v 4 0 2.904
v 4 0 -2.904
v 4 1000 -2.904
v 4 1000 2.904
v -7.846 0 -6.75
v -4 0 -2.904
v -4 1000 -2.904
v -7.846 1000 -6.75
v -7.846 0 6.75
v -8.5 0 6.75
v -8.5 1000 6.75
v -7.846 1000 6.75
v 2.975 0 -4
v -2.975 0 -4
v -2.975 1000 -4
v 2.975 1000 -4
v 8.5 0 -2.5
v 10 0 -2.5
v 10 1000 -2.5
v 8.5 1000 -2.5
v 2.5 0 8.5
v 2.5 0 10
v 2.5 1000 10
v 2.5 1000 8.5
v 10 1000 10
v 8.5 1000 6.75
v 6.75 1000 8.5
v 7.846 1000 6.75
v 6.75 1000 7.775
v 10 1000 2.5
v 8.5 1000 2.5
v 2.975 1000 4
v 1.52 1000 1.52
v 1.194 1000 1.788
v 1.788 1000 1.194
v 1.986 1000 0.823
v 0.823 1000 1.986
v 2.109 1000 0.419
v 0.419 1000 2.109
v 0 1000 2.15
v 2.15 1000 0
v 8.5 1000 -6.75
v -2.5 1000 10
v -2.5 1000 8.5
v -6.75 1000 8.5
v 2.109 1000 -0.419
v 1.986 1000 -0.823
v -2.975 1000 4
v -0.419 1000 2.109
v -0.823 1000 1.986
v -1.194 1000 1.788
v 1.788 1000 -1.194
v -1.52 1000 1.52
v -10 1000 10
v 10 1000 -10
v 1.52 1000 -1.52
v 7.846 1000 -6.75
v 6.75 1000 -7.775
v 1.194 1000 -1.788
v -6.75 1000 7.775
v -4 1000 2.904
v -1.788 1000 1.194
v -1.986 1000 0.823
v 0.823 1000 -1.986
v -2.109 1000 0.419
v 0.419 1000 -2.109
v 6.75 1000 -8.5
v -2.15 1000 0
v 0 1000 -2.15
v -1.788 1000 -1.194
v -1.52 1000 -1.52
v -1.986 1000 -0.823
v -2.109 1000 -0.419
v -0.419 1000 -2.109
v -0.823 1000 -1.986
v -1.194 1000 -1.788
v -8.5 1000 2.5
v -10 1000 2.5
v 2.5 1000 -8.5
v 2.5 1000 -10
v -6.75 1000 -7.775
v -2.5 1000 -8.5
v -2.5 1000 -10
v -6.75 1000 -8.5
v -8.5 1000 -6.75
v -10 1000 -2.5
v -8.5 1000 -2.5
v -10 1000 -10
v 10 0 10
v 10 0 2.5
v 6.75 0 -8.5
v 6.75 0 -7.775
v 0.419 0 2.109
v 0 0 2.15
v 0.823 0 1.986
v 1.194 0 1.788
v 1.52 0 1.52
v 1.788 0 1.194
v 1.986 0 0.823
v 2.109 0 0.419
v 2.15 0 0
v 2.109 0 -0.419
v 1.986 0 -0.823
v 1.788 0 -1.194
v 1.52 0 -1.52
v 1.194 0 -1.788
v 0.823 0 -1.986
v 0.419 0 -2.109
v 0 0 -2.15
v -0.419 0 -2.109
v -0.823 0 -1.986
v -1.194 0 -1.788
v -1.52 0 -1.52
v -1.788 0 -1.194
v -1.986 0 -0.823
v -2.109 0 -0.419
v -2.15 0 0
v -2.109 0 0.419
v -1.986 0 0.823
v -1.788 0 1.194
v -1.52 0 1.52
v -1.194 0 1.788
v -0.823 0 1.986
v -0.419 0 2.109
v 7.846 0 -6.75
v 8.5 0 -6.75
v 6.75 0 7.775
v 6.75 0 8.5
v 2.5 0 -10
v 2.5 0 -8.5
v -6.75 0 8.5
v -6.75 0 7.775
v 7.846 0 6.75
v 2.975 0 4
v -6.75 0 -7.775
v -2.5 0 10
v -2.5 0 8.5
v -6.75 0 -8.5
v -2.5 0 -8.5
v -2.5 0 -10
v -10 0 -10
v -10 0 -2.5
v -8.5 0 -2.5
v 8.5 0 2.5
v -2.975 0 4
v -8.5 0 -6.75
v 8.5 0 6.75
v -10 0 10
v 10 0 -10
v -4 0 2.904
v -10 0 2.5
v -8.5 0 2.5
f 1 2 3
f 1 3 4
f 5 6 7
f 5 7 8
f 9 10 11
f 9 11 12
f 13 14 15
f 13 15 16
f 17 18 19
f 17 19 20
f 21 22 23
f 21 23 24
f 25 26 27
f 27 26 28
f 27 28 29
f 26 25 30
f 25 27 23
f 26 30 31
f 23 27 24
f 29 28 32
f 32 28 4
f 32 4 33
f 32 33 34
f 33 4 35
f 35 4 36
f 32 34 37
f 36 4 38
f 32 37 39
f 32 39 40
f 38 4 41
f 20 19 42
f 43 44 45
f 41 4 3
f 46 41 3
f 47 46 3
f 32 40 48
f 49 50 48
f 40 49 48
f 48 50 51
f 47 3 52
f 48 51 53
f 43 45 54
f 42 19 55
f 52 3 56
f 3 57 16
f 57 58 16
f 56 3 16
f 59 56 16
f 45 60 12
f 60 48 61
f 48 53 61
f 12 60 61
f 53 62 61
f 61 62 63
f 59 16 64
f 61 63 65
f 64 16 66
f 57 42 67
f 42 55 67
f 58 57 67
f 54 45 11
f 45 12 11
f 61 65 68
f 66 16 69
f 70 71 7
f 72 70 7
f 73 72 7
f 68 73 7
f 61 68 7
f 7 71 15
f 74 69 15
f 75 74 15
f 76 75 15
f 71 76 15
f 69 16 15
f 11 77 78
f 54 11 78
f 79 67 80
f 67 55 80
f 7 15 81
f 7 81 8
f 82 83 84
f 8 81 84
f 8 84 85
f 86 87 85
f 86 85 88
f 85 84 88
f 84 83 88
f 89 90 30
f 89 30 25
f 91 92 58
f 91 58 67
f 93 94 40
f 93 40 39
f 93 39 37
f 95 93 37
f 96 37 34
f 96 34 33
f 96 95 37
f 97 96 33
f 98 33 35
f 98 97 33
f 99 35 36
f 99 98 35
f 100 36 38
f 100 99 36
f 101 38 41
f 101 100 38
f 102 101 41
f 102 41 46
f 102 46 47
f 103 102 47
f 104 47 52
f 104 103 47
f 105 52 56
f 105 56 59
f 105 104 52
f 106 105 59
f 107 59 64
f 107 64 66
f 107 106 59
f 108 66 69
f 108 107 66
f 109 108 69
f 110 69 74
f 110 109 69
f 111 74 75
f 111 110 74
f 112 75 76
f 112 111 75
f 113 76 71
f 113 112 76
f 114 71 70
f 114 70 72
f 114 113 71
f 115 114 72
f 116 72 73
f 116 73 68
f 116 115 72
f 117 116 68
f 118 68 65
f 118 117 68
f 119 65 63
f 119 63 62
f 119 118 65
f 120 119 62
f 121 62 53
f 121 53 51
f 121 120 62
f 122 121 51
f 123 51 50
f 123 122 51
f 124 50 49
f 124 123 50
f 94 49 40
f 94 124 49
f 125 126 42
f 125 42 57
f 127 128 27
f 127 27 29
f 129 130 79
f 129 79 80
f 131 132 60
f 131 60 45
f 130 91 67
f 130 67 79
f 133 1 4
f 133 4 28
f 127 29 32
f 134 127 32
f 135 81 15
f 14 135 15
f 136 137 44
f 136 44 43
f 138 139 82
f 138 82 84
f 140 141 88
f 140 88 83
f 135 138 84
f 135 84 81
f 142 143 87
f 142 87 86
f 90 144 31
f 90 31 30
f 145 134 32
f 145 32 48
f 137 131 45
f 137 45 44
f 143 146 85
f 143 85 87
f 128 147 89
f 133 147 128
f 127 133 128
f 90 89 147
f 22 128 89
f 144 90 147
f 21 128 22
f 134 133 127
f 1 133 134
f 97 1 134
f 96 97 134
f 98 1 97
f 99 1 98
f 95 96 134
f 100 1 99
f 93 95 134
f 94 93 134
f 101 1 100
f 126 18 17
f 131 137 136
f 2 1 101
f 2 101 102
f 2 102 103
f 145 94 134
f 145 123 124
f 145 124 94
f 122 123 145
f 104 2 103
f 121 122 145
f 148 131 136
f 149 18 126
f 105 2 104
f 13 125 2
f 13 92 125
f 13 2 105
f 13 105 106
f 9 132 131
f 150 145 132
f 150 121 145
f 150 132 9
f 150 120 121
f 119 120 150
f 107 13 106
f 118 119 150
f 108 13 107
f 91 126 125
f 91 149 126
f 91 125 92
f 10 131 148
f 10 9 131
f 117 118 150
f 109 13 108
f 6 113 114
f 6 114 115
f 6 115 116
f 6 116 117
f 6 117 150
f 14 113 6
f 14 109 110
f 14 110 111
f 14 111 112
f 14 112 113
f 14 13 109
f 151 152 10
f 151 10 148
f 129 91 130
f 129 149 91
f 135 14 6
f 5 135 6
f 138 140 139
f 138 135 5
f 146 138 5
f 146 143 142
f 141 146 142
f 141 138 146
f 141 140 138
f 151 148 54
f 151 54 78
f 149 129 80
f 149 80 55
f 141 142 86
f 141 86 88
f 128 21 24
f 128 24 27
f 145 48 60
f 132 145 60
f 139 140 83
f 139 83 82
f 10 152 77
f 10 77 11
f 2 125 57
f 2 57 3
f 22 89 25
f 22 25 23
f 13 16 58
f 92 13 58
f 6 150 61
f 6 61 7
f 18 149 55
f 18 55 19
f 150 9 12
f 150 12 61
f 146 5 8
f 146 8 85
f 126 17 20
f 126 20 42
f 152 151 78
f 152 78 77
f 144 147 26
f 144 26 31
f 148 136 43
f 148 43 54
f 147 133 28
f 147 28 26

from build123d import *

# Parameters (mm, degrees)
SKETCH1_R           = 2.15
BOSS_EXTRUDE1_DEPTH = 1000


with BuildPart() as part:
    # Sketch1 → Boss-Extrude1 (new body)
    with BuildSketch(Plane(origin=(0, 0, 0), x_dir=(1, 0, 0), z_dir=(0, 1, 0))):
        Polygon((-10, 10), (-2.5, 10), (-2.5, 8.499999999), (-6.75, 8.499999999), (-6.75, 7.77515127), (-2.97484873, 4), (2.97484873, 4), (6.75, 7.77515127), (6.75, 8.499999999), (2.5, 8.499999999), (2.5, 10), (10, 10), (10, 2.5), (8.5, 2.5), (8.5, 6.75), (7.846169074, 6.75), (4, 2.903830926), (4, -2.903830926), (7.846169074, -6.75), (8.5, -6.75), (8.5, -2.5), (10, -2.5), (10, -10), (2.5, -10), (2.5, -8.499999999), (6.75, -8.499999999), (6.75, -7.77515127), (2.97484873, -4), (-2.97484873, -4), (-6.75, -7.77515127), (-6.75, -8.499999999), (-2.5, -8.499999999), (-2.5, -10), (-10, -10), (-10, -2.5), (-8.5, -2.5), (-8.5, -6.75), (-7.846169074, -6.75), (-4, -2.903830926), (-4, 2.903830926), (-7.846169074, 6.75), (-8.5, 6.75), (-8.5, 2.5), (-10, 2.5), align=None)
        with Locations(Location((0, 0, 0), (0, 0, 270))):
            Circle(SKETCH1_R, mode=Mode.SUBTRACT)
    extrude(amount=BOSS_EXTRUDE1_DEPTH)


solid = part.part
